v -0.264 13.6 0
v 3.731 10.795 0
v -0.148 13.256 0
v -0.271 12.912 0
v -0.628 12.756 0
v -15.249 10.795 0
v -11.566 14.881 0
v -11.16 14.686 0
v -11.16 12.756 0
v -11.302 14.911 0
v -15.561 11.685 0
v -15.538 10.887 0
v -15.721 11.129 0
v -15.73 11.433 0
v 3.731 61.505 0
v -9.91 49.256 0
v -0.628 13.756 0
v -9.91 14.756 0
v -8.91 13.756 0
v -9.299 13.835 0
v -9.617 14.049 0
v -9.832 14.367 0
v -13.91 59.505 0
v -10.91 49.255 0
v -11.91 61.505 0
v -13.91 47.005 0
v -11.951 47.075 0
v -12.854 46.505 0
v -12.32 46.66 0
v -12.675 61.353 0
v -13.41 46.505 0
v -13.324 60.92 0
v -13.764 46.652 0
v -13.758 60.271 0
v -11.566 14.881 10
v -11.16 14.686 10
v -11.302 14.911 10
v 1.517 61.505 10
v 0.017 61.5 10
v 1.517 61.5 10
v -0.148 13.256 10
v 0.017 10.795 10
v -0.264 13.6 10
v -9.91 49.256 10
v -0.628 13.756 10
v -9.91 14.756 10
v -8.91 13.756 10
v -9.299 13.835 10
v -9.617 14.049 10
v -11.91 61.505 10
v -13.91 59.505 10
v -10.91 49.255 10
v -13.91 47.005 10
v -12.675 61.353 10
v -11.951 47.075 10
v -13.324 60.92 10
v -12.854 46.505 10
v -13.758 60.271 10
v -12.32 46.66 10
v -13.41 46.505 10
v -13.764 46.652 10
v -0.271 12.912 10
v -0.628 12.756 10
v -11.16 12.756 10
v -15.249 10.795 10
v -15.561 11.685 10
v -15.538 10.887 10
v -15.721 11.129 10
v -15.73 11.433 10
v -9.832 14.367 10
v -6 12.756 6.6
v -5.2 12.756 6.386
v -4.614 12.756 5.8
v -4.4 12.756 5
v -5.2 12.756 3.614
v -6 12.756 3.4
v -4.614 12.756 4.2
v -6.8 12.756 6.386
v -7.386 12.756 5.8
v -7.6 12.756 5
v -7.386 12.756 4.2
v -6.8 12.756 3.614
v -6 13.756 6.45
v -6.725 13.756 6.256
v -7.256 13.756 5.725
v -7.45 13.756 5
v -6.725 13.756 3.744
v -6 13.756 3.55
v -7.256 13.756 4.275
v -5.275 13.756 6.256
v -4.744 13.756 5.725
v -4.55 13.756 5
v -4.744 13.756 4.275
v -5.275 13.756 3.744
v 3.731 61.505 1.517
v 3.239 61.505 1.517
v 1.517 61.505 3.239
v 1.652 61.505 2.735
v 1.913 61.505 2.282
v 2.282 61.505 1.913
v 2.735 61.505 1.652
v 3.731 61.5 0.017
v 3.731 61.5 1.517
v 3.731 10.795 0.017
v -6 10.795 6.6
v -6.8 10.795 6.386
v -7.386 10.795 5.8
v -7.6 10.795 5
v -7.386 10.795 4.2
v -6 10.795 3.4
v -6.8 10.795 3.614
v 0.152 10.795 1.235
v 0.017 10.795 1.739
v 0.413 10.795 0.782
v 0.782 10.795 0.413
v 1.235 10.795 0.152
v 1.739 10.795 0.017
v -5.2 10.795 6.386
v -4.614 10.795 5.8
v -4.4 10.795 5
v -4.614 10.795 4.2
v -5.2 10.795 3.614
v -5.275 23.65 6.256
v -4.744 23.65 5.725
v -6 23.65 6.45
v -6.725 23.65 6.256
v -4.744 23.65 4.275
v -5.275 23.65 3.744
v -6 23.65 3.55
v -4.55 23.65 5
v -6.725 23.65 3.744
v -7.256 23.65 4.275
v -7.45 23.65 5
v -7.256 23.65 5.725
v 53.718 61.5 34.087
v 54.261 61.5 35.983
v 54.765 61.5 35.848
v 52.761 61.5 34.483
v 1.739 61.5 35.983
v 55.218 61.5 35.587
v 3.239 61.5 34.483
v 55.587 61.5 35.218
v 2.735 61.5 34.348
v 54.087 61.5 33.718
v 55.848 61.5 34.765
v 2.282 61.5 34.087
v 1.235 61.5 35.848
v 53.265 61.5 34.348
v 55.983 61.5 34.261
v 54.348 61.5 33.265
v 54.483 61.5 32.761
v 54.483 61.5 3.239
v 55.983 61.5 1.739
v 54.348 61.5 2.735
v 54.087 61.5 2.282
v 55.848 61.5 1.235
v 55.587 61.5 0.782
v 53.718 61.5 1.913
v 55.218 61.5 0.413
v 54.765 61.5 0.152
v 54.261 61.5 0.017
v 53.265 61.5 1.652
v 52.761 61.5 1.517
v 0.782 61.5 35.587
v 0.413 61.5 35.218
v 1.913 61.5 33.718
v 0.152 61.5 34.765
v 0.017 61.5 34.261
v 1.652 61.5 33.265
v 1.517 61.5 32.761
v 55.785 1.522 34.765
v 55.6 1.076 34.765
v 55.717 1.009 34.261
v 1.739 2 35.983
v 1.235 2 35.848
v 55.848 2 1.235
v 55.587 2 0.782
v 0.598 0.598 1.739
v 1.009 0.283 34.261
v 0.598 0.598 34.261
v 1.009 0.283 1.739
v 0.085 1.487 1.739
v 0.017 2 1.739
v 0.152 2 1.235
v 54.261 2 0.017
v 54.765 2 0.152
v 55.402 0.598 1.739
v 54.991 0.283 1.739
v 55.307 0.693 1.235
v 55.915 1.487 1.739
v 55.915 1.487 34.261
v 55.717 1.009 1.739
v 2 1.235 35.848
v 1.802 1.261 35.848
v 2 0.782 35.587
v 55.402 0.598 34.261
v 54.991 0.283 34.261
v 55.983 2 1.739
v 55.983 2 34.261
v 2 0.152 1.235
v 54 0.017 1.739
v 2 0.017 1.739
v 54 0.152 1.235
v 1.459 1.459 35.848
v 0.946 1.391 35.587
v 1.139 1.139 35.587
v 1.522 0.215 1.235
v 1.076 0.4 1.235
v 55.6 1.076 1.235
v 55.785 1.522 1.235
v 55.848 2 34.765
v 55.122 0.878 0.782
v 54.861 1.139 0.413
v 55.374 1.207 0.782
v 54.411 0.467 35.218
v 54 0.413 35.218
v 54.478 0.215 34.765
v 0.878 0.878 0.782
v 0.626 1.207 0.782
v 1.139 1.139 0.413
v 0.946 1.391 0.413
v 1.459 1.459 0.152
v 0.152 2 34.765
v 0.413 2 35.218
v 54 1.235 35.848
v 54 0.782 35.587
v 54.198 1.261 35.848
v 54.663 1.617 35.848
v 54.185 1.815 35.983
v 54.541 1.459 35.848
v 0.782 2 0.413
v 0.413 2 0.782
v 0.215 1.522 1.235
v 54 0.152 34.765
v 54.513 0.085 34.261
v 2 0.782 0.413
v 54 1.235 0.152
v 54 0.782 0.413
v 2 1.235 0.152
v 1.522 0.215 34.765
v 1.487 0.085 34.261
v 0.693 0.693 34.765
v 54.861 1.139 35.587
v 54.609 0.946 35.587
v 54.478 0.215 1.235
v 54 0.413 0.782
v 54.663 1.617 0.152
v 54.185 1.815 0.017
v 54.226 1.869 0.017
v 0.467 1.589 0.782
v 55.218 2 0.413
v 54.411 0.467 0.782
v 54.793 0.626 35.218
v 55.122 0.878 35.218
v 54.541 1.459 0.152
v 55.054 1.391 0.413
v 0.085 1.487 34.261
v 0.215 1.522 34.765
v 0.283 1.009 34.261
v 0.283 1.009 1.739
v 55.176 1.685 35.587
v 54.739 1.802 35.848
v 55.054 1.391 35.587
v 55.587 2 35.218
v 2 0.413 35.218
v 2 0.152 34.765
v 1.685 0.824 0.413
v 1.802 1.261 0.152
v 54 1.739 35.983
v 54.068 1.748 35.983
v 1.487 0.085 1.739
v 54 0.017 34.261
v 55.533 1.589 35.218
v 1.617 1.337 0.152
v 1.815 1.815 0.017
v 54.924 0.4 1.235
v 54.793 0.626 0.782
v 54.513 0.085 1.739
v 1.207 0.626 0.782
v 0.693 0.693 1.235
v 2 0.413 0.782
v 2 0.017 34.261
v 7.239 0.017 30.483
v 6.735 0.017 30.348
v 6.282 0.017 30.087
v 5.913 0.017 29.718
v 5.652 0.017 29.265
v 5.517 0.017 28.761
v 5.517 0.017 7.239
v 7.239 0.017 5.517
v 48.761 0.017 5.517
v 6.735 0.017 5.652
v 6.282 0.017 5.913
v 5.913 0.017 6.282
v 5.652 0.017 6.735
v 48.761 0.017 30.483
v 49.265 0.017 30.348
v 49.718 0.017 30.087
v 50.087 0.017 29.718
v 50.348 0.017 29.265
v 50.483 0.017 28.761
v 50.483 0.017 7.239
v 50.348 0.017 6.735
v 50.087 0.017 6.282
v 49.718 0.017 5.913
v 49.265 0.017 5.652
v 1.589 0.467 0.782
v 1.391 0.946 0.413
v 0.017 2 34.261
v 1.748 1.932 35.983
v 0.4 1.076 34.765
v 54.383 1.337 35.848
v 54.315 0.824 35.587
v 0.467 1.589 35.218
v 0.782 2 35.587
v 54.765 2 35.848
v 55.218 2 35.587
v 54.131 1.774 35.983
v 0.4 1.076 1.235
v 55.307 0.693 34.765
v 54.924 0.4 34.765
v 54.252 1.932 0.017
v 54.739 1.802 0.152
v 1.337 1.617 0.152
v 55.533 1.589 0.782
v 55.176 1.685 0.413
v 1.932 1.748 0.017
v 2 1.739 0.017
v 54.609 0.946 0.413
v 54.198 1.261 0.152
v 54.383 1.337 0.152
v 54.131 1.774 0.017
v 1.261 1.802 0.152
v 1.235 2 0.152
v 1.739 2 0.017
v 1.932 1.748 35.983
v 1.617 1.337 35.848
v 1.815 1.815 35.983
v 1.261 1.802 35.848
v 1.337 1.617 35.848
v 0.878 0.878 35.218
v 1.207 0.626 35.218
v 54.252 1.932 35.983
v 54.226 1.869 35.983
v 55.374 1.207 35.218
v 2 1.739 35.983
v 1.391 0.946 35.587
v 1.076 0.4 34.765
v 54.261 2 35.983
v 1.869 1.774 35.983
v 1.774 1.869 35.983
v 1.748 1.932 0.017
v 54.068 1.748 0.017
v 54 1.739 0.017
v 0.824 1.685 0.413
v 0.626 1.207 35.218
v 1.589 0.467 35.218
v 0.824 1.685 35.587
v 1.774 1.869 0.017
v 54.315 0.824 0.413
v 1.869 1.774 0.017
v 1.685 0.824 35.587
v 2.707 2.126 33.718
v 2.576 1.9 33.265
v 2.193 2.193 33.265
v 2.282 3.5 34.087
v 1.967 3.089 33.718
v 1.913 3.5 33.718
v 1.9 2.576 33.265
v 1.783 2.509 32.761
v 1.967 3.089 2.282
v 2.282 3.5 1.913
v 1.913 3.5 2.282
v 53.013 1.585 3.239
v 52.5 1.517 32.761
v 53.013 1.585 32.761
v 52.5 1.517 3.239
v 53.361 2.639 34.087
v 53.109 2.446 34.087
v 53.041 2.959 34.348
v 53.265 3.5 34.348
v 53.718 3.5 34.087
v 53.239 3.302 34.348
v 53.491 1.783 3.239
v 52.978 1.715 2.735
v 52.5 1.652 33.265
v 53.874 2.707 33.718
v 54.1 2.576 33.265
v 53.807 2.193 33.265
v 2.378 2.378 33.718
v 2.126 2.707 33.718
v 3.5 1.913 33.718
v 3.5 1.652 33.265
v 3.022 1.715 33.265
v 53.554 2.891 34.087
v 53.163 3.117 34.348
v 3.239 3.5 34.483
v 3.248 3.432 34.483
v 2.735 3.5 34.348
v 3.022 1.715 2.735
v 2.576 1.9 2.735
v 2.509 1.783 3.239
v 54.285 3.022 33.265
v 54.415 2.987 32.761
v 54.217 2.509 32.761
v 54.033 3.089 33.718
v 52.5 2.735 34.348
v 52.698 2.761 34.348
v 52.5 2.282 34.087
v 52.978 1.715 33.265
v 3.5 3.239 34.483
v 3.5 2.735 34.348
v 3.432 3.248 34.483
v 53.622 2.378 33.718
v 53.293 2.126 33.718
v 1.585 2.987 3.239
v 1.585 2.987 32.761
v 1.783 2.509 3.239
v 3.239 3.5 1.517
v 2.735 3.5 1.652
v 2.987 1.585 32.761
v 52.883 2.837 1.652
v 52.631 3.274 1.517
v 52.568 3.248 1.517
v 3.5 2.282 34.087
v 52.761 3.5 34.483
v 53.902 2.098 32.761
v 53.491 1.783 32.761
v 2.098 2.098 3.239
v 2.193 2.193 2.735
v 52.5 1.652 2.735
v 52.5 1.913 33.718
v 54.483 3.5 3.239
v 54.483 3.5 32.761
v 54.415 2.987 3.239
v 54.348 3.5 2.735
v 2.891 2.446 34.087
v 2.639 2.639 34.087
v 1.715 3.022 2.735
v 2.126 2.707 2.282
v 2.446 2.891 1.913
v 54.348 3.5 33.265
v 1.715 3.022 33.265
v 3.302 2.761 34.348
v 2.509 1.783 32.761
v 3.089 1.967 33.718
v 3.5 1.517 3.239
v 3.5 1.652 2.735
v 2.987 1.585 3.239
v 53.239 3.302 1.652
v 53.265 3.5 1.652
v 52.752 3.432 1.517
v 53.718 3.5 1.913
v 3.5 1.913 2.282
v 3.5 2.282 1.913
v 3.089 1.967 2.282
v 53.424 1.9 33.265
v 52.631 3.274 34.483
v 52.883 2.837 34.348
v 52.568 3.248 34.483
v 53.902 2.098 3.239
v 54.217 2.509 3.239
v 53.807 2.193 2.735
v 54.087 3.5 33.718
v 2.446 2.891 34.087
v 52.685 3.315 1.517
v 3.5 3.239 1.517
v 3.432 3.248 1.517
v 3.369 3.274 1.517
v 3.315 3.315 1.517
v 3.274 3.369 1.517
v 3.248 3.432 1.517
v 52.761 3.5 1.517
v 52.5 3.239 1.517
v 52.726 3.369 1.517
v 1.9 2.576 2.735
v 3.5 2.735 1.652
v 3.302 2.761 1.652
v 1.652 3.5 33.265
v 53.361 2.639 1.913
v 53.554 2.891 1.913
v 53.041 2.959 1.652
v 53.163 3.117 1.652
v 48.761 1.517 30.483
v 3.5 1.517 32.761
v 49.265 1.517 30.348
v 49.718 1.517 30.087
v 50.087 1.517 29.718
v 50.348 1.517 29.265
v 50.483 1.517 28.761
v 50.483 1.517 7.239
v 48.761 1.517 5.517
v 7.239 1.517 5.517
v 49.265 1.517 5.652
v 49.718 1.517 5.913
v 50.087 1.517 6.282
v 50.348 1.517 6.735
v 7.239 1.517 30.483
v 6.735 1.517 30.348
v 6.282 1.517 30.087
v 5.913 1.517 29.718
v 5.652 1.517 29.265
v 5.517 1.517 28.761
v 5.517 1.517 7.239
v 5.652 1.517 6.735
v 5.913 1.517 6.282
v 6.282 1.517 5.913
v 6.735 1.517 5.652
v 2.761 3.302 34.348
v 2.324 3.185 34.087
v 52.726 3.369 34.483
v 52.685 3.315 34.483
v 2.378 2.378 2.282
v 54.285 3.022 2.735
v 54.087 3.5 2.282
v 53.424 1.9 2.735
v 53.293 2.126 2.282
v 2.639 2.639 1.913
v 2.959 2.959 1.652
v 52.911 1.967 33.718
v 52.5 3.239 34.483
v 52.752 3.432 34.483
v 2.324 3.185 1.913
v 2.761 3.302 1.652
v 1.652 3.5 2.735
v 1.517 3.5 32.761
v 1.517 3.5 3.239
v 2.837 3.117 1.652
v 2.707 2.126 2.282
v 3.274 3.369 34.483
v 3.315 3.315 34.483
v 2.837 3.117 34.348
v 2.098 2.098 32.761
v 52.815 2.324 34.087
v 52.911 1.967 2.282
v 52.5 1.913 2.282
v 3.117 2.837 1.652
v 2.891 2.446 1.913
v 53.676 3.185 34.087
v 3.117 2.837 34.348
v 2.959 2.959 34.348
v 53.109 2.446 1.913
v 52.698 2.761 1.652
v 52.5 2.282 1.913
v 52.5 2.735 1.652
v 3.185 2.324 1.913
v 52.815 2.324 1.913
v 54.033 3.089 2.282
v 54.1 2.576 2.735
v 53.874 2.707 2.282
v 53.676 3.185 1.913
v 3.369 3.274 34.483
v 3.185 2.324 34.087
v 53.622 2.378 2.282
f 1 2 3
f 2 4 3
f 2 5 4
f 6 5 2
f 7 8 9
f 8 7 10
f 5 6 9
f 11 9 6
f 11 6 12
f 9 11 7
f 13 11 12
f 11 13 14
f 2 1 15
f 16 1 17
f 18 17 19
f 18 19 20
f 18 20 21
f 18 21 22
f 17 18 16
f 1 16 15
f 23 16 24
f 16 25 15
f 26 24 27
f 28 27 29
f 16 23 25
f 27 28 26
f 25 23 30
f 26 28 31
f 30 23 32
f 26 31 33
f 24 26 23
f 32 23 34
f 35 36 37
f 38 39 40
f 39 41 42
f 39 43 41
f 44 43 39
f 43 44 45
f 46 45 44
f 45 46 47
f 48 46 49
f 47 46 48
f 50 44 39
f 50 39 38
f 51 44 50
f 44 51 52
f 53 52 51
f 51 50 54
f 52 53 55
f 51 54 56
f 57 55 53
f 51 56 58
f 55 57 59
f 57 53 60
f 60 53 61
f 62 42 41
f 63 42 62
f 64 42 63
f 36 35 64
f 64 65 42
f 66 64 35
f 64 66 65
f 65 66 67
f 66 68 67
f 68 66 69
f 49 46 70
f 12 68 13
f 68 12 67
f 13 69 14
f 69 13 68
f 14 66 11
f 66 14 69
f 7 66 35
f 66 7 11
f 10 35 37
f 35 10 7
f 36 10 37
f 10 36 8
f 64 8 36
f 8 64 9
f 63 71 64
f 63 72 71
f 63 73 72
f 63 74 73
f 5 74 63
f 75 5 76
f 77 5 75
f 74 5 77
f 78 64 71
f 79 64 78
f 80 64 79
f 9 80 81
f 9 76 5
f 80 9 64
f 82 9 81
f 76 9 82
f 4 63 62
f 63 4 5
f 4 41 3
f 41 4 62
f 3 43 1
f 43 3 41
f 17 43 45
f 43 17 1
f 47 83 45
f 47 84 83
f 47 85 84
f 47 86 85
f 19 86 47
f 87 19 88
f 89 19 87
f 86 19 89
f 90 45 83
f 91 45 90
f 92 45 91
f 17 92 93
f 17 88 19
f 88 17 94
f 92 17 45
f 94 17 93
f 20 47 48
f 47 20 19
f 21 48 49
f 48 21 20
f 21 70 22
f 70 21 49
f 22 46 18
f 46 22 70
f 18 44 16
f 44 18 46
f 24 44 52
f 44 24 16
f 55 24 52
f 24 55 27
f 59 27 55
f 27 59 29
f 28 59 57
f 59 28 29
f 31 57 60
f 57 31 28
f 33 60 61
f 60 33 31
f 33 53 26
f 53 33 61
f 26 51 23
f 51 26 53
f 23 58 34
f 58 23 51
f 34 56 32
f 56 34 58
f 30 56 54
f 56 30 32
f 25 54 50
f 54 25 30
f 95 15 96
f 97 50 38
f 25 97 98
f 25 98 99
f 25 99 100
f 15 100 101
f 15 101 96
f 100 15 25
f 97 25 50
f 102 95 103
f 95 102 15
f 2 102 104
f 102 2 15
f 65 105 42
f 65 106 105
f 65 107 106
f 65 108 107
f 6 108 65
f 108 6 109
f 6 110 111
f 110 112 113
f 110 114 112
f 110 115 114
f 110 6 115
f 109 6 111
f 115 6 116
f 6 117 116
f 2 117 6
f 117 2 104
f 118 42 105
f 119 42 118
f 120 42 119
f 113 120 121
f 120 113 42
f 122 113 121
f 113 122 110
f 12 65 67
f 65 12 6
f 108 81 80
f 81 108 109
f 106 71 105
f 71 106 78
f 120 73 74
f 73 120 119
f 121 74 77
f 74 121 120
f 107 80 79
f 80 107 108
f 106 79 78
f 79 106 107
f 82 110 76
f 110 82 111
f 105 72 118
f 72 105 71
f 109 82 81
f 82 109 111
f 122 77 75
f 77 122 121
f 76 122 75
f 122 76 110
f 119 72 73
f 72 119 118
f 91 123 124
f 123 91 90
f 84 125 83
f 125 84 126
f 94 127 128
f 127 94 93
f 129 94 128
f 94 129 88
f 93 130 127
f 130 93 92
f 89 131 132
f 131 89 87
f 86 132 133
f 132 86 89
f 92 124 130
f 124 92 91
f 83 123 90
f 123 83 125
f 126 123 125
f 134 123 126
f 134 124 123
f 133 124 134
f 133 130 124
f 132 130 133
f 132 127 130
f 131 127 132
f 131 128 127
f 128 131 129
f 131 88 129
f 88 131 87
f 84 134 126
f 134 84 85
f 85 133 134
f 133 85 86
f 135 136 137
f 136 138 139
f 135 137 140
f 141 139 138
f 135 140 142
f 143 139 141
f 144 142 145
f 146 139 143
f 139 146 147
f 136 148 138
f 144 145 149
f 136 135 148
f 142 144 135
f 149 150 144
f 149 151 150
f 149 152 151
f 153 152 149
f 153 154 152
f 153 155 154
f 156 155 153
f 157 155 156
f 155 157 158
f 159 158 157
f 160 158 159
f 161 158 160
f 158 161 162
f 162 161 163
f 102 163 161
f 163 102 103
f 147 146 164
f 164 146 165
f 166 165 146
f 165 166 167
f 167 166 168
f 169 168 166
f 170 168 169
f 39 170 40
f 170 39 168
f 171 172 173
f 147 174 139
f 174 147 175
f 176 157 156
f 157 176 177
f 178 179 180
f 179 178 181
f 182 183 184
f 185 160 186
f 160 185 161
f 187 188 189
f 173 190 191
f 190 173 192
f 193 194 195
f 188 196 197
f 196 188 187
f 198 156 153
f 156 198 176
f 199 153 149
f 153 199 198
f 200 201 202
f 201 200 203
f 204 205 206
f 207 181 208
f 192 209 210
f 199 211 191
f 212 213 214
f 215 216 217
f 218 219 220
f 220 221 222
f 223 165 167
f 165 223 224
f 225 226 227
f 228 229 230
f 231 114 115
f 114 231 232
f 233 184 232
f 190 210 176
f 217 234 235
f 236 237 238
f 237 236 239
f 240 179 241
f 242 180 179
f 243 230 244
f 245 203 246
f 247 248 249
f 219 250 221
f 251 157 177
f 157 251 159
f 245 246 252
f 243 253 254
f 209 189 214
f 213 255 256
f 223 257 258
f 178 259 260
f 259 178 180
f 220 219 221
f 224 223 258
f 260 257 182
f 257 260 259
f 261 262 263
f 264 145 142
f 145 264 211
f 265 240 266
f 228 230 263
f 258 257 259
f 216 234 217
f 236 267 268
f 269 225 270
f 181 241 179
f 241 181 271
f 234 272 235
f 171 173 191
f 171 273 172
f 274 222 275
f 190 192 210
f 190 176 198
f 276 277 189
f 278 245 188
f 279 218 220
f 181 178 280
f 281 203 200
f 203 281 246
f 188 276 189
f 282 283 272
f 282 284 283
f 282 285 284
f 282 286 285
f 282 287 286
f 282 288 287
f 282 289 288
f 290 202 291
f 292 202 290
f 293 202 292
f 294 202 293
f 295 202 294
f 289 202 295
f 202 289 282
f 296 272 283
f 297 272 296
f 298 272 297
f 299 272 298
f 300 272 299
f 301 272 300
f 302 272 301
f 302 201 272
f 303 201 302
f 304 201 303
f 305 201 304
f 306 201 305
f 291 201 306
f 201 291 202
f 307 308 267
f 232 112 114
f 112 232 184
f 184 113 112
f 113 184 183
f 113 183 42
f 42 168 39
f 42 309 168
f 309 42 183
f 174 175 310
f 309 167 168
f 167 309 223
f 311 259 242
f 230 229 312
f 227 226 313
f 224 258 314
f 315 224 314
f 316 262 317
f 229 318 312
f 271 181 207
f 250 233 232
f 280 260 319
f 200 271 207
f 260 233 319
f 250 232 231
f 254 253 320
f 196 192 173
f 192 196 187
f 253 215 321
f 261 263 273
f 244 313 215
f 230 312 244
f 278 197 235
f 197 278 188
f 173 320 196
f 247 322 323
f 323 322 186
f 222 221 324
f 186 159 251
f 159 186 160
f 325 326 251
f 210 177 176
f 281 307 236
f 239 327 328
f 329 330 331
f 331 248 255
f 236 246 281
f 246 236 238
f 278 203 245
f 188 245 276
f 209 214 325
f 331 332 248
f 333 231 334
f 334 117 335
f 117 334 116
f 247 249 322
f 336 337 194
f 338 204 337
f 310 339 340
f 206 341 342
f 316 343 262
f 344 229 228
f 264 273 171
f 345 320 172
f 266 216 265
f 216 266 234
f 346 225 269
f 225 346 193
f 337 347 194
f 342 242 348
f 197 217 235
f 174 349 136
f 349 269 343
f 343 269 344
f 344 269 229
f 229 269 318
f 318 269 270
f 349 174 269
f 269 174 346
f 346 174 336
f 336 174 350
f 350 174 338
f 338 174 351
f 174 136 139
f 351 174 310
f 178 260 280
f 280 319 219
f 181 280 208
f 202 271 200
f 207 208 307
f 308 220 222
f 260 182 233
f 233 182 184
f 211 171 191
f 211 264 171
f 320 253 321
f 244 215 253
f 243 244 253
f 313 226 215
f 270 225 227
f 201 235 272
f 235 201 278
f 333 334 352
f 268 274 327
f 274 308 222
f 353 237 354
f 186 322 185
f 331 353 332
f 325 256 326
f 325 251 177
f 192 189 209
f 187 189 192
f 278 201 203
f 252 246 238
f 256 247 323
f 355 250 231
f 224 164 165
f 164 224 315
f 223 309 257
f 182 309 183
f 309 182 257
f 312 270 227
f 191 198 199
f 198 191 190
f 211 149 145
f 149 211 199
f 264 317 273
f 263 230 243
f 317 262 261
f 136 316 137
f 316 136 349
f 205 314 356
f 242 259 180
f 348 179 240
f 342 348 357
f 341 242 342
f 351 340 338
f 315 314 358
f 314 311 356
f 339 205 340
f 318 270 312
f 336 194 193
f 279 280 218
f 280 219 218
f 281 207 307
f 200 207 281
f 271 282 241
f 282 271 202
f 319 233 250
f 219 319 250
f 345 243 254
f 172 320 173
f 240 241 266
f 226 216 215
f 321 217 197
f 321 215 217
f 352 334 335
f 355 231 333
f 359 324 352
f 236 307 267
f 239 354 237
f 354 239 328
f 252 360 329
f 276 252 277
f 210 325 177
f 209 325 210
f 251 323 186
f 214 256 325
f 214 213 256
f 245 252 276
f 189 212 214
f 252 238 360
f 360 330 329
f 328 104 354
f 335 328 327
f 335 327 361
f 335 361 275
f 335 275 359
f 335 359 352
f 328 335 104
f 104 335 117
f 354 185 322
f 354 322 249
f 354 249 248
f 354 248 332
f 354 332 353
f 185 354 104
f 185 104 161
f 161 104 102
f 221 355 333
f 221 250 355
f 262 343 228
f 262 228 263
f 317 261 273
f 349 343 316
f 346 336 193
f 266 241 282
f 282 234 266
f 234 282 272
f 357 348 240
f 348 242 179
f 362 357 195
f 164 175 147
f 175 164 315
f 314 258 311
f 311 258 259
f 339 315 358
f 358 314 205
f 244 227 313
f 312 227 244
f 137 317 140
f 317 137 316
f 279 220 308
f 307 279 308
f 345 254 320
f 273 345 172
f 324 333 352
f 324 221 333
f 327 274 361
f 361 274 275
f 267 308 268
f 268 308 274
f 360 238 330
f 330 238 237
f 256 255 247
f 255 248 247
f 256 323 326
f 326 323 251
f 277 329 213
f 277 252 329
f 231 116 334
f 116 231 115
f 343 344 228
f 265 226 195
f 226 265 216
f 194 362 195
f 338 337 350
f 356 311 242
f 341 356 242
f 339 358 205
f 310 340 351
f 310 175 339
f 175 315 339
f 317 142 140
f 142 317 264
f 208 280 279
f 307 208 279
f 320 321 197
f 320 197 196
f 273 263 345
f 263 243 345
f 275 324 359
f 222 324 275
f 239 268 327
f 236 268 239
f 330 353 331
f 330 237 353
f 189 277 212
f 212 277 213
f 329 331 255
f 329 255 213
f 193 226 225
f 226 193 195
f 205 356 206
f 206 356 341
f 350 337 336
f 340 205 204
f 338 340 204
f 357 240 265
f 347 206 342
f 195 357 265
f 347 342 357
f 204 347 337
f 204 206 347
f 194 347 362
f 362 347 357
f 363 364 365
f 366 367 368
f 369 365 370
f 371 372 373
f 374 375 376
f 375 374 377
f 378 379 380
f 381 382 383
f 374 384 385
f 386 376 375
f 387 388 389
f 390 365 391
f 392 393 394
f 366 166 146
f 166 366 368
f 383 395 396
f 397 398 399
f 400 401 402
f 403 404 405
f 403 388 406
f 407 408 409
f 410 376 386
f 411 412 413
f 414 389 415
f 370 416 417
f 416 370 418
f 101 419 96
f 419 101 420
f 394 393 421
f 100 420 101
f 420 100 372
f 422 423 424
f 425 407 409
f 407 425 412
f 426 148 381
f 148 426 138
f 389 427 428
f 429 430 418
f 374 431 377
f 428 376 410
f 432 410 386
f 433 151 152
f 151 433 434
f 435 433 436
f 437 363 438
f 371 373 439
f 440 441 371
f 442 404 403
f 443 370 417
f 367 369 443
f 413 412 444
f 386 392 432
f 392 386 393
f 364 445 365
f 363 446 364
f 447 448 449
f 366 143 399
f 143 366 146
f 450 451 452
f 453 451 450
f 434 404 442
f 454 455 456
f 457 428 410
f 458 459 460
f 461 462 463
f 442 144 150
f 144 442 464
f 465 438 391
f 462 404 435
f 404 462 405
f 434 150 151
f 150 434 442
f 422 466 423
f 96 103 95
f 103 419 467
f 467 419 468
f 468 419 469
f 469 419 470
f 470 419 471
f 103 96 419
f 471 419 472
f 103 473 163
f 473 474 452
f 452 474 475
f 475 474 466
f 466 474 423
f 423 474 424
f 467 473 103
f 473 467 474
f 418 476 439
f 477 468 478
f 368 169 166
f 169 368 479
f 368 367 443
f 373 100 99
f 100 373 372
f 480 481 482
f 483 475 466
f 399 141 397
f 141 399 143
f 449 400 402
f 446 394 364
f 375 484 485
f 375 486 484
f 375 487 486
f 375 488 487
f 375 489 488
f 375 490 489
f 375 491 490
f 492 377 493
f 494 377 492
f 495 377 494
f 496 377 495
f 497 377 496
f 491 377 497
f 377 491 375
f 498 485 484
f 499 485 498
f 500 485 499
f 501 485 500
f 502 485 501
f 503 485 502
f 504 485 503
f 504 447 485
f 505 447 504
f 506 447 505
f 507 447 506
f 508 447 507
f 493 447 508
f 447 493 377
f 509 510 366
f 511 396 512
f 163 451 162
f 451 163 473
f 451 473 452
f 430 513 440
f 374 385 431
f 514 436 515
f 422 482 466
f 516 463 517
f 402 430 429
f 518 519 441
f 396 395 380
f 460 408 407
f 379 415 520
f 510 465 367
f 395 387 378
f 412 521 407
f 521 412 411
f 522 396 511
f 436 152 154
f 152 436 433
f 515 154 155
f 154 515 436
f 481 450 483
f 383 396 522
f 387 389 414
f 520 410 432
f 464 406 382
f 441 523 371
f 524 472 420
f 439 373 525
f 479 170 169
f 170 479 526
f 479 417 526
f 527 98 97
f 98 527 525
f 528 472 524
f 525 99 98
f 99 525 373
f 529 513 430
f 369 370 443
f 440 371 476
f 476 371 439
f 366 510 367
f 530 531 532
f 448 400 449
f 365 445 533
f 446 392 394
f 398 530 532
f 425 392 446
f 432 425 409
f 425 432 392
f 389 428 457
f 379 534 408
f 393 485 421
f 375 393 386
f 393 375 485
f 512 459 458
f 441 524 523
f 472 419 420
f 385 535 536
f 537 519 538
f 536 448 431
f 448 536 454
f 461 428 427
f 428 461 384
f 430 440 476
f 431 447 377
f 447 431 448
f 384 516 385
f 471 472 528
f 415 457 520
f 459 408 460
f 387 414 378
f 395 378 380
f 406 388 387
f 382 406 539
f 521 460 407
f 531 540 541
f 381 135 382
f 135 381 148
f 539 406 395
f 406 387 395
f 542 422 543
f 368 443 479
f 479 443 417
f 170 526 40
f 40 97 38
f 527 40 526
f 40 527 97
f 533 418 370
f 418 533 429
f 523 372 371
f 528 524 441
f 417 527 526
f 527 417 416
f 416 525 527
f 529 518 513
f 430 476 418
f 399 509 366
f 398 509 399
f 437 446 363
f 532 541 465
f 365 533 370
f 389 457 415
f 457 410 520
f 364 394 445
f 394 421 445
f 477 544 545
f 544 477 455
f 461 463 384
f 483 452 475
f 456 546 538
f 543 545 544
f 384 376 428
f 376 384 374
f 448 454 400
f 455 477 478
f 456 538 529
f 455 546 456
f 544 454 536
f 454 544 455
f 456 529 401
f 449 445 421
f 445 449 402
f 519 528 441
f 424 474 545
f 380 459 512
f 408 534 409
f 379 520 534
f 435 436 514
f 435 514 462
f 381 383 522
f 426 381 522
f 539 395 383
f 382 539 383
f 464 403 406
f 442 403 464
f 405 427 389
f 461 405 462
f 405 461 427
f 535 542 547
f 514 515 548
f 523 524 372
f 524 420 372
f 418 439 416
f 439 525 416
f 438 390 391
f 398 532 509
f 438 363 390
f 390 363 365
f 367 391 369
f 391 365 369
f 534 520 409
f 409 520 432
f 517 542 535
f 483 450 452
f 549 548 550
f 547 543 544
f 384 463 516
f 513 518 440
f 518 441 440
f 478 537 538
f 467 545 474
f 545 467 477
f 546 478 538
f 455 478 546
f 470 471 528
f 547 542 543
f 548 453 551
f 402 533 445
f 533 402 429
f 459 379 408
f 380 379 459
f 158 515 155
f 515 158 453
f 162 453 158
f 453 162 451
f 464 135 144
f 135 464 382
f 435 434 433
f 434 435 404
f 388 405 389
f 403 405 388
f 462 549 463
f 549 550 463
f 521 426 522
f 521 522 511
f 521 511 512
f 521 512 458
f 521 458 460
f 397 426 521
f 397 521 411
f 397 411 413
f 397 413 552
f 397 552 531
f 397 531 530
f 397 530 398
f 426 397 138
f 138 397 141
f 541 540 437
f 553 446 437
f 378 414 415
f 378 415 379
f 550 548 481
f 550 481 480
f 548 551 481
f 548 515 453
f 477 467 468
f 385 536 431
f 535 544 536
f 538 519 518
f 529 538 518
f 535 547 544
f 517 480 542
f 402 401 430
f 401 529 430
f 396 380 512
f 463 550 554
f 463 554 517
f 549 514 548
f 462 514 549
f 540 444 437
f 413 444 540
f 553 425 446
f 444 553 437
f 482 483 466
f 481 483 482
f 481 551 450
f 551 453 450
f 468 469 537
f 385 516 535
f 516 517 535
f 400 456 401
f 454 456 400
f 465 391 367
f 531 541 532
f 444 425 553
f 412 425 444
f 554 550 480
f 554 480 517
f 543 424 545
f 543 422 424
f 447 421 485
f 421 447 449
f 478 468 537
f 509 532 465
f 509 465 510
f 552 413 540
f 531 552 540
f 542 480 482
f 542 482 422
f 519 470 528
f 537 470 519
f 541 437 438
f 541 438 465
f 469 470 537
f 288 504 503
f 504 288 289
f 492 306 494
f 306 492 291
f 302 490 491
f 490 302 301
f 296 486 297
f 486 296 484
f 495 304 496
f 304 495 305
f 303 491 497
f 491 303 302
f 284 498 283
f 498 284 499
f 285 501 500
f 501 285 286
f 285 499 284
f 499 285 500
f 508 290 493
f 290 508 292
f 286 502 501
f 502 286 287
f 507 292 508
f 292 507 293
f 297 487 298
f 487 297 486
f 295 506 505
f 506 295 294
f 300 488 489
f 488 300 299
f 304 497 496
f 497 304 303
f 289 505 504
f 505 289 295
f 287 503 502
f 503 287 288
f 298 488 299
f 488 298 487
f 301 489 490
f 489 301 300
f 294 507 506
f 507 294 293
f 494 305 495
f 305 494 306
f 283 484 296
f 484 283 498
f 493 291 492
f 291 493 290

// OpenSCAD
// This work is licensed under a Creative Commons Attribution-ShareAlike 3.0 Unported License.
// https://creativecommons.org/licenses/by-sa/3.0/

// dimensions of power supply
powerSupplyWidth = 52;
powerSupplyThickness = 32;
// how deep the power supply sits inside
pocketDepth = 60;

// adjustment for your printer: make the power supply fit more loosely
slack = 1;
// thickness of walls all the way around
wallThickness = 1.5;
// width of frame at the bottom, holding the power supply from falling through
bottomFlangeWidth = 4;
// radius of round edges on 5 sides
roundingRadius = 2;

// DIN rail clamp
clampThickness = 10;
// how deep the bolt should go into the solid part, past the spring clip
boltHoleDepth = 10;
// diameter where the bolt passes through the spring clip
looseBoltDiameter = 3.2;
// diameter where the bolt should screw into the DIN holder body
tightBoltDiameter = 2.9;

// DIN rail clamp
// adapted from Thingiverse 101024 by Robert Hunt
// made with 1mm wider opening: my rail is bigger or my printer prints too small
// Dimensions: 19.74 x 51 x clampThickness
module din_clip() {
	$fn = 12;
	difference() {
		linear_extrude(height=clampThickness, convexity=5) {
			// imported Robert's DXF to Inkscape, adjusted, then exported via https://github.com/martymcguire/inkscape-openscad-poly
			polygon(points=
				[[-9.731, 25.355], [5.910, 25.355], [6.675, 25.203], [7.324, 24.770], [7.758, 24.121], [7.910, 23.355], [7.910, 10.855],
				[7.764, 10.502], [7.410, 10.355], [6.854, 10.355], [6.320, 10.510], [5.951, 10.925], [4.910, 13.105], [3.910, 13.106],
				[3.910, -21.394], [3.832, -21.783], [3.617, -22.101], [3.299, -22.315], [2.910, -22.394], [-5.372, -22.394], [-5.736, -22.550],
				[-5.852, -22.894], [-5.729, -23.238], [-5.372, -23.394], [5.160, -23.394], [5.160, -21.464], [5.302, -21.239], [5.566, -21.269],
				[9.561, -24.465], [9.730, -24.717], [9.721, -25.021], [9.538, -25.263], [9.249, -25.355], [-9.731, -25.355]]
				, paths=
				[[0, 1, 2, 3, 4, 5, 6, 7, 8, 9, 10, 11, 12, 13, 14, 15, 16, 17, 18, 19, 20, 21, 22, 23, 24, 25, 26, 27, 28, 29, 30, 31, 32, 33, 0]]
			);
		}
		translate([0, -22.5, clampThickness / 2]) {
			rotate([90, 90, 0]) {
				cylinder(h= boltHoleDepth, r = looseBoltDiameter / 2);
			}
		}
		translate([0, -22.5, clampThickness / 2]) {
			rotate([-90, 90, 0]) {
				cylinder(h= boltHoleDepth, r = tightBoltDiameter / 2);
			}
		}
	}
}
// End of DIN clip by Robert Hunt

module roundAllCornersCube(x,y,z,r) {
	translate([r, r, r])
		minkowski() {
			cube([x - 2 * r, y - 2 * r, z - 2 * r]);
			sphere(r=r);
		}
}

module holder() {
	$fn = 24;
	difference() {
		union() {
			translate([-6, pocketDepth - 49.35 + 25.5, 0]) mirror([1, 0, 0]) din_clip();
			intersection() {
				cube([powerSupplyWidth + wallThickness * 2 + slack, pocketDepth + wallThickness, powerSupplyThickness + wallThickness * 2 + slack]);
				roundAllCornersCube(powerSupplyWidth + wallThickness * 2 + slack, pocketDepth + 10, powerSupplyThickness + wallThickness * 2 + slack, roundingRadius);
			}
		}
		translate([wallThickness, wallThickness, wallThickness])
			roundAllCornersCube(powerSupplyWidth + slack, pocketDepth + 10, powerSupplyThickness + slack, roundingRadius);

		translate([wallThickness + bottomFlangeWidth, -10, wallThickness + bottomFlangeWidth])
			roundAllCornersCube(powerSupplyWidth - bottomFlangeWidth * 2 + slack, pocketDepth + 10, powerSupplyThickness - bottomFlangeWidth * 2 + slack, roundingRadius);
	}
}

holder();
